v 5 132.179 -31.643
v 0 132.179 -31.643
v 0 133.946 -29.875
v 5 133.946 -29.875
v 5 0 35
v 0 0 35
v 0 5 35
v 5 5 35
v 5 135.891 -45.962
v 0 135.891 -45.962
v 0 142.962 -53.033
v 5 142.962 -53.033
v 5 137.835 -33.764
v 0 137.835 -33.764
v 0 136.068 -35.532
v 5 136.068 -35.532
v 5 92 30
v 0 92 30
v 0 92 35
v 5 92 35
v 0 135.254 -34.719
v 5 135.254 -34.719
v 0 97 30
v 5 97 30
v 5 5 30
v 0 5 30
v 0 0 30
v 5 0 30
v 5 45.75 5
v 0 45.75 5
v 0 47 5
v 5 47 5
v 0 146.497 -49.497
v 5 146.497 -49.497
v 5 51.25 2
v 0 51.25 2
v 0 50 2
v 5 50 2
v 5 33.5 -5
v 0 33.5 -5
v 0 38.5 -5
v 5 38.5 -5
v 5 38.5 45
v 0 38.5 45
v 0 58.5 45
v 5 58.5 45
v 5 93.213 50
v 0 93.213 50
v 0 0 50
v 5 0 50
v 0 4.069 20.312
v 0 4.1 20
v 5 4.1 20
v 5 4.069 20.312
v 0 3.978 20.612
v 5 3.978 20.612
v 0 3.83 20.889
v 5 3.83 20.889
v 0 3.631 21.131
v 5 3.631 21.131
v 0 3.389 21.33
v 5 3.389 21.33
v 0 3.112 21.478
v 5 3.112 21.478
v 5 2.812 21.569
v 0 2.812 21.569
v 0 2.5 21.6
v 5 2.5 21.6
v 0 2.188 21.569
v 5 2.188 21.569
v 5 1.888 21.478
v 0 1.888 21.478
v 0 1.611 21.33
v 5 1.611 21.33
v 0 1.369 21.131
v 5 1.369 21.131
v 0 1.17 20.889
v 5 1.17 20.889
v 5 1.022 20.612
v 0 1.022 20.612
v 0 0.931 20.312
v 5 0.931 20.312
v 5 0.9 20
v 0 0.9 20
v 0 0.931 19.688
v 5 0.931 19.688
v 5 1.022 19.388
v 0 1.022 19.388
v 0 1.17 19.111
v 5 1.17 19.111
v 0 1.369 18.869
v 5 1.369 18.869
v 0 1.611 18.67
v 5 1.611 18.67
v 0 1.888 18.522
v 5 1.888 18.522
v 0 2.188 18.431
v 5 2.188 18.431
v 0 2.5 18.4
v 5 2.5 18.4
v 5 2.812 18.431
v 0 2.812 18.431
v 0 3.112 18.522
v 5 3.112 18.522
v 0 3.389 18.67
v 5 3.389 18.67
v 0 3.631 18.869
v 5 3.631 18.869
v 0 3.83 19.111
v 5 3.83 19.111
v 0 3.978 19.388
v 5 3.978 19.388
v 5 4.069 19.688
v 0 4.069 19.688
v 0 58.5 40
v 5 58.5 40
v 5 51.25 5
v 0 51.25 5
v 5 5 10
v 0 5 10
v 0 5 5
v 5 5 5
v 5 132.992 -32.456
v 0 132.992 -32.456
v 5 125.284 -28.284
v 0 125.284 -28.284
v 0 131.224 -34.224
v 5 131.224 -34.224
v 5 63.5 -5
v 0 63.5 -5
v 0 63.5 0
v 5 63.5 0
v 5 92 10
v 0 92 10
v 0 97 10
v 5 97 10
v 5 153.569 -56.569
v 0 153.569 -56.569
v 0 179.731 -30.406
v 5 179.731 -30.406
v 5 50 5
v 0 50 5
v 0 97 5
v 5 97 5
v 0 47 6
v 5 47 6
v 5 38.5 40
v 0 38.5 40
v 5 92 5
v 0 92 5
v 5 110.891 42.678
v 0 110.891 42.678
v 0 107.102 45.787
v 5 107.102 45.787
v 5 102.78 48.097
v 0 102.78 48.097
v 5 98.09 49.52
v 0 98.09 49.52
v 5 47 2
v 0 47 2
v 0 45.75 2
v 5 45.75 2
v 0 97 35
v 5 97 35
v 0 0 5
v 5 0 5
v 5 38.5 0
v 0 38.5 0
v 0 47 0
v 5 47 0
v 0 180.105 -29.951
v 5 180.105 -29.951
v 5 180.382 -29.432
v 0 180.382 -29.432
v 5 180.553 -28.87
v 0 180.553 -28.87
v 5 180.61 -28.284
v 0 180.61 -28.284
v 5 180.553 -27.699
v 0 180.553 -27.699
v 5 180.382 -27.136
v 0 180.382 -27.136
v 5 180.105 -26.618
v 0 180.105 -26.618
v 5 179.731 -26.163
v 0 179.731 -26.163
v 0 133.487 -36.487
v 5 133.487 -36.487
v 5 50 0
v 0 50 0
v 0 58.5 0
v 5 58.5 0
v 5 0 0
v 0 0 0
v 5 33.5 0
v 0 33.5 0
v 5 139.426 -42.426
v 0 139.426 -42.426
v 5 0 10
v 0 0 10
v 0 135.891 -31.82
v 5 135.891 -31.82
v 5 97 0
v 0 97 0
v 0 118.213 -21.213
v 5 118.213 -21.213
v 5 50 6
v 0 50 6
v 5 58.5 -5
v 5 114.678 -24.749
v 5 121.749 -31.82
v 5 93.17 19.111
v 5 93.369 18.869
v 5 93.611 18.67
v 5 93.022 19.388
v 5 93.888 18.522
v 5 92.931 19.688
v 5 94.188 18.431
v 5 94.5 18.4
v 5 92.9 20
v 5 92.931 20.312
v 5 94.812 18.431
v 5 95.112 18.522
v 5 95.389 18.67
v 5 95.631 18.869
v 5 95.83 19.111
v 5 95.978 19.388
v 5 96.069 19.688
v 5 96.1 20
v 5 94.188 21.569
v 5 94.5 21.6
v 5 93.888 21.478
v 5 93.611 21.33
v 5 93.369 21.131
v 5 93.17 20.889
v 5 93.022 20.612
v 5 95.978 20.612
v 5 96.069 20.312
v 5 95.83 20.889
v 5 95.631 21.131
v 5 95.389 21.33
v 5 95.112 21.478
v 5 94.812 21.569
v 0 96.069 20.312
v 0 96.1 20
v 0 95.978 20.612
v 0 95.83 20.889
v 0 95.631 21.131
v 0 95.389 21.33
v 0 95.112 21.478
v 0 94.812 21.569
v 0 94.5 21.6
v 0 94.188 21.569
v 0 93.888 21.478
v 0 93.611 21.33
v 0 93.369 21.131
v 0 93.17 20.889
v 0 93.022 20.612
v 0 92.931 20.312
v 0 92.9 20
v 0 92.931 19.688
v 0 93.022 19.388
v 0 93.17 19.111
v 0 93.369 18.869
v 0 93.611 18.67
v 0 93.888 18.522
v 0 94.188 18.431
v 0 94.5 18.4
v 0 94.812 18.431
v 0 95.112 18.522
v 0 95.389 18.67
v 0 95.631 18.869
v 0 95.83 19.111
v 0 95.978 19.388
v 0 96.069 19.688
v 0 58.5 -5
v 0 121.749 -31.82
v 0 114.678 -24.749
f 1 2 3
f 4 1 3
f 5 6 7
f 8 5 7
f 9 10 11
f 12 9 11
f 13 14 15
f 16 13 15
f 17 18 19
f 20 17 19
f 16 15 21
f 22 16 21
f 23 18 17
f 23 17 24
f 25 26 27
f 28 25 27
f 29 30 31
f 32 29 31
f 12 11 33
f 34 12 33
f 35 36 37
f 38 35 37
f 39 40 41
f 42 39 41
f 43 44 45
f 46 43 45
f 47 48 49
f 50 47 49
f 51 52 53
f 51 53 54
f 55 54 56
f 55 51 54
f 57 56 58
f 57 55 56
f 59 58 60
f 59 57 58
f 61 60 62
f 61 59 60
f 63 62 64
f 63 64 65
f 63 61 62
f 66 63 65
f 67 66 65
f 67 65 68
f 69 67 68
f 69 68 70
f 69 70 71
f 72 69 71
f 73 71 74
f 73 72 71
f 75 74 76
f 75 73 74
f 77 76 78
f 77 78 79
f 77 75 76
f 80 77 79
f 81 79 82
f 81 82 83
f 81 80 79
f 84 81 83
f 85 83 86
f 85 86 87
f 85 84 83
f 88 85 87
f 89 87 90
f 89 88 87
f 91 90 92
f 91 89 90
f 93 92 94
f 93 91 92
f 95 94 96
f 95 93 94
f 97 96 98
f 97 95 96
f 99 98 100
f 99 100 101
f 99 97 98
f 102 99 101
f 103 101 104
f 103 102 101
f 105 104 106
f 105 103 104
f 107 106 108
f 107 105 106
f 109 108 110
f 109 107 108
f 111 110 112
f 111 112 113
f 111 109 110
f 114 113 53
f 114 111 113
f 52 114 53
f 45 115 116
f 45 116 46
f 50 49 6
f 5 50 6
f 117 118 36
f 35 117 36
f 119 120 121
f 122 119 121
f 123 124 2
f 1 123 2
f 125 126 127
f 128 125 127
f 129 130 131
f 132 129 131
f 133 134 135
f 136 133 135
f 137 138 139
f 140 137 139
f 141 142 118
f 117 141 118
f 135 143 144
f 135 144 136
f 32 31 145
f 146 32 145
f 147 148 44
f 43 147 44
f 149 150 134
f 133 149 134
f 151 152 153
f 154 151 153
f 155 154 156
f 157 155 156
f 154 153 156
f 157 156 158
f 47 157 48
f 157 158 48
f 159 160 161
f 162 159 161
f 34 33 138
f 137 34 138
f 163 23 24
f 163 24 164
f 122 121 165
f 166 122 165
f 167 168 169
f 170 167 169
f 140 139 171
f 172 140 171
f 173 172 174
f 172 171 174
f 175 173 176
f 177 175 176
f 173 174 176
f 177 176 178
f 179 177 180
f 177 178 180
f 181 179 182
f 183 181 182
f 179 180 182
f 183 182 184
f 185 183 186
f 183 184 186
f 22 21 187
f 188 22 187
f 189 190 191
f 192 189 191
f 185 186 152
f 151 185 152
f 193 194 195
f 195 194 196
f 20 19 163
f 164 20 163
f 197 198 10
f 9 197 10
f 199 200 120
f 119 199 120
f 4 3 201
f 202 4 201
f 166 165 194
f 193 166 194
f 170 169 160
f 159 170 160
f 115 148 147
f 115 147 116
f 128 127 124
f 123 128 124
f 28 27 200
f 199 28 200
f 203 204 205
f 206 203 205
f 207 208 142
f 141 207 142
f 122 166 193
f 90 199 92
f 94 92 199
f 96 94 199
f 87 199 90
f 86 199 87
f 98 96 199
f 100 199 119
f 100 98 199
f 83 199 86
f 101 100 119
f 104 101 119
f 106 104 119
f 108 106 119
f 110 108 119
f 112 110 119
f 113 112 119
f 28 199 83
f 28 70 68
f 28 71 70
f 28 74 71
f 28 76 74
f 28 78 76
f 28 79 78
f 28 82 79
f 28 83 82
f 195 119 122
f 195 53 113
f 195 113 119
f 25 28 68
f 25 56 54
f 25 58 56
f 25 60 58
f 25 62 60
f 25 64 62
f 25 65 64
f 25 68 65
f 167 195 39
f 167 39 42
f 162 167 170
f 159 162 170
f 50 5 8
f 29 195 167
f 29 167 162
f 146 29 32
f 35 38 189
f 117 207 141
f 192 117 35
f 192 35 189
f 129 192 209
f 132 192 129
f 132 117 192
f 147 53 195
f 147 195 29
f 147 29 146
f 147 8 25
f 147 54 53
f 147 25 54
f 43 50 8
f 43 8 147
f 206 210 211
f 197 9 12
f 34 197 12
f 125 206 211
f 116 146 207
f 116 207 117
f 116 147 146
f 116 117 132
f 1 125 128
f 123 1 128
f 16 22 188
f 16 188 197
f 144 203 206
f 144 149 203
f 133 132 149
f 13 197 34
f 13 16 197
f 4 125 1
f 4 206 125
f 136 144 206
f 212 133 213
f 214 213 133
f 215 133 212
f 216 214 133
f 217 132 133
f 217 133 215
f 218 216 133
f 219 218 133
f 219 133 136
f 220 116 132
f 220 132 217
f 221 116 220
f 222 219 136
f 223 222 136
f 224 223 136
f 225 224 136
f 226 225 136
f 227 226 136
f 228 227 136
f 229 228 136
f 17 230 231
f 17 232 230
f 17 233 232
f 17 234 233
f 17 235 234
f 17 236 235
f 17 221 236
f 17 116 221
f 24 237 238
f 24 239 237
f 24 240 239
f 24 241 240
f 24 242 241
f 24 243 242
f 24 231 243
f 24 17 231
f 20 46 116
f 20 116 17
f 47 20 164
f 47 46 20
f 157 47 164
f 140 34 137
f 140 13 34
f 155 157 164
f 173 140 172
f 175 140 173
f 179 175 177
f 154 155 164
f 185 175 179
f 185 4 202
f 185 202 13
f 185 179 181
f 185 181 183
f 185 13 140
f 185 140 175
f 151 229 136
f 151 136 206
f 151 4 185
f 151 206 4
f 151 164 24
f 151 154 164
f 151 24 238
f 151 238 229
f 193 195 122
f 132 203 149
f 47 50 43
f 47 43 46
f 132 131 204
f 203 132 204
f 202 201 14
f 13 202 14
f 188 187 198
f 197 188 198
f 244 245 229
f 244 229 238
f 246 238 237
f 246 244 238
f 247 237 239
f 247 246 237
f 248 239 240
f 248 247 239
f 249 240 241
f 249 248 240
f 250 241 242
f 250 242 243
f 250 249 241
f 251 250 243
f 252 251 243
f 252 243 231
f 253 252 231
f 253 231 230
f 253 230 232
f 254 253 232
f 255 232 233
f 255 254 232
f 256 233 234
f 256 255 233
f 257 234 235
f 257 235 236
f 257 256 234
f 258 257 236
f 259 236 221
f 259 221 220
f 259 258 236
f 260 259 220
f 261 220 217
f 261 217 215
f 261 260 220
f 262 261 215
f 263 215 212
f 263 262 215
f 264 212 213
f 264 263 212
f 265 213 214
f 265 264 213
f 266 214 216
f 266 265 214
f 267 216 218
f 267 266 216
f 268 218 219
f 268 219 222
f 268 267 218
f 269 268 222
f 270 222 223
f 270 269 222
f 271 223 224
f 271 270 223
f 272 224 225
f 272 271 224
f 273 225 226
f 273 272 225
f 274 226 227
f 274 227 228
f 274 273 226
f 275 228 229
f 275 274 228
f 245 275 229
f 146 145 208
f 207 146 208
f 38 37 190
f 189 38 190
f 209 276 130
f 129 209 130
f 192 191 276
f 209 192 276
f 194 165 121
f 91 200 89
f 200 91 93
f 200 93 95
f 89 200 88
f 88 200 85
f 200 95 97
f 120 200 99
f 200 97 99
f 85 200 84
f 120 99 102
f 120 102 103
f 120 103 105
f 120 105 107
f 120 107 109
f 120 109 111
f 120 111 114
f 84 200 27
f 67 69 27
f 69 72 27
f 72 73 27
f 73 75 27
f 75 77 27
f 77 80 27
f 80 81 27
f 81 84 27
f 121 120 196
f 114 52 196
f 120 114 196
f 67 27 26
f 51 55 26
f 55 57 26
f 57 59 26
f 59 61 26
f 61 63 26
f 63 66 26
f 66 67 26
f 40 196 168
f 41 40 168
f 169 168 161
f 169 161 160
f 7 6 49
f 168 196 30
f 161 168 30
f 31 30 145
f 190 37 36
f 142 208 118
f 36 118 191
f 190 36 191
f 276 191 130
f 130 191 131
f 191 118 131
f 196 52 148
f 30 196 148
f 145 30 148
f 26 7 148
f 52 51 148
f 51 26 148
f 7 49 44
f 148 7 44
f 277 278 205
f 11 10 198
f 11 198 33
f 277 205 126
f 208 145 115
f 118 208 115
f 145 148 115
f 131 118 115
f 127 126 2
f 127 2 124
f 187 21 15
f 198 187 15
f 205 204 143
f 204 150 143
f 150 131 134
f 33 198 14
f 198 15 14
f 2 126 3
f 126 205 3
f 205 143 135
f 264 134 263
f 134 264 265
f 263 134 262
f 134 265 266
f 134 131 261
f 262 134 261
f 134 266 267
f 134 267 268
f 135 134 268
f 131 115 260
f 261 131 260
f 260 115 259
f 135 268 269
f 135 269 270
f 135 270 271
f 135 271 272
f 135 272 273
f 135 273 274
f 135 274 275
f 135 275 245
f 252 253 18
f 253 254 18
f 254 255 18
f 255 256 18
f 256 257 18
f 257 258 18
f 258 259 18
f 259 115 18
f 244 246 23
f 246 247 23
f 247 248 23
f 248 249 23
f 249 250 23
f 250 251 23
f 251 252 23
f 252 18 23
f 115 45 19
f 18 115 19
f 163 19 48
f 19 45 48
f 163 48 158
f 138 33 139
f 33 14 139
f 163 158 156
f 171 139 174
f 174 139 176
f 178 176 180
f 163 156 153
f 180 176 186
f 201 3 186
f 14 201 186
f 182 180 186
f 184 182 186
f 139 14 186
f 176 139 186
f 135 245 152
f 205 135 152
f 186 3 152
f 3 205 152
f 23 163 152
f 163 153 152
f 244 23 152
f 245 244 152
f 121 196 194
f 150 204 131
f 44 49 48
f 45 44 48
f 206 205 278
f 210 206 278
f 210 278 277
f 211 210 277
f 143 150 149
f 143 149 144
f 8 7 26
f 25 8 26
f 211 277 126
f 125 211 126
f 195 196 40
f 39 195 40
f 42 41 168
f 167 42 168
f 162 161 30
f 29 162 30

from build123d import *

# Parameters (mm, degrees)
F1_R     = 1.6
F1_W     = 20
F1_H     = 5
F1_W_2   = 5
F2_DEPTH = 5


with BuildPart() as f2:
    # F1 (on Right) → F2 (new body)
    with BuildSketch(Plane.YZ):
        with BuildLine():
            Line((0, 5), (0, 0))
            Line((0, 0), (33.5, 0))
            Line((33.5, 0), (33.5, -5))
            Line((33.5, -5), (38.5, -5))
            Line((38.5, -5), (38.5, 0))
            Line((38.5, 0), (47, 0))
            Line((47, 0), (47, 2))
            Line((47, 2), (45.75, 2))
            Line((45.75, 2), (45.75, 5))
            Line((45.75, 5), (47, 5))
            Line((47, 5), (47, 6))
            Line((47, 6), (50, 6))
            Line((50, 6), (50, 5))
            Line((50, 5), (51.25, 5))
            Line((51.25, 5), (51.25, 2))
            Line((51.25, 2), (50, 2))
            Line((50, 2), (50, 0))
            Line((50, 0), (58.5, 0))
            Line((58.5, 0), (58.5, -5))
            Line((58.5, -5), (63.5, -5))
            Line((63.5, -5), (63.5, 0))
            Line((63.5, 0), (97, 0))
            Line((97, 0), (118.2132034356, -21.2132034356))
            Line((118.2132034356, -21.2132034356), (125.2842712475, -28.2842712475))
            Line((125.2842712475, -28.2842712475), (131.2239682094, -34.2239682094))
            Line((131.2239682094, -34.2239682094), (132.9917351624, -32.4562012565))
            Line((132.9917351624, -32.4562012565), (132.178562364, -31.6430284581))
            Line((132.178562364, -31.6430284581), (133.946329317, -29.8752615051))
            Line((133.946329317, -29.8752615051), (135.8908729653, -31.8198051534))
            Line((135.8908729653, -31.8198051534), (137.8354166135, -33.7643488017))
            Line((137.8354166135, -33.7643488017), (136.0676496606, -35.5321157546))
            Line((136.0676496606, -35.5321157546), (135.2544768622, -34.7189429563))
            Line((135.2544768622, -34.7189429563), (133.4867099092, -36.4867099092))
            Line((133.4867099092, -36.4867099092), (139.4264068712, -42.4264068712))
            Line((139.4264068712, -42.4264068712), (146.4974746831, -49.4974746831))
            Line((146.4974746831, -49.4974746831), (153.5685424949, -56.5685424949))
            Line((153.5685424949, -56.5685424949), (179.7314933988, -30.405591591))
            ThreePointArc((179.7314933988, -30.405591591), (180.6101730553, -28.2842712475), (179.7314933988, -26.1629509039))
            Line((179.7314933988, -26.1629509039), (110.8908729653, 42.6776695297))
            ThreePointArc((110.8908729653, 42.6776695297), (102.7802892447, 48.0969883128), (93.2132034356, 50))
            Line((93.2132034356, 50), (0, 50))
            Line((0, 50), (0, 40))
            Line((0, 40), (0, 35))
            Line((0, 35), (5, 35))
            Line((5, 35), (5, 30))
            Line((5, 30), (0, 30))
            Line((0, 30), (0, 10))
            Line((0, 10), (5, 10))
            Line((5, 10), (5, 5))
            Line((5, 5), (0, 5))
        make_face()
        with Locations((2.5, 20)):
            Circle(F1_R, mode=Mode.SUBTRACT)
        with Locations((48.5, 42.5)):
            Rectangle(F1_W, F1_H, mode=Mode.SUBTRACT)
        with Locations((94.5, 7.5)):
            Rectangle(F1_W_2, F1_H, mode=Mode.SUBTRACT)
        with Locations((94.5, 20)):
            Circle(F1_R, mode=Mode.SUBTRACT)
        with Locations((94.5, 32.5)):
            Rectangle(F1_W_2, F1_H, mode=Mode.SUBTRACT)
        Polygon((142.9619407771, -53.033008589), (146.4974746831, -49.4974746831), (139.4264068712, -42.4264068712), (135.8908729653, -45.9619407771), align=None)
        Polygon((125.2842712475, -28.2842712475), (118.2132034356, -21.2132034356), (114.6776695297, -24.7487373415), (121.7487373415, -31.8198051534), align=None)
    extrude(amount=F2_DEPTH)


solid = f2.part
